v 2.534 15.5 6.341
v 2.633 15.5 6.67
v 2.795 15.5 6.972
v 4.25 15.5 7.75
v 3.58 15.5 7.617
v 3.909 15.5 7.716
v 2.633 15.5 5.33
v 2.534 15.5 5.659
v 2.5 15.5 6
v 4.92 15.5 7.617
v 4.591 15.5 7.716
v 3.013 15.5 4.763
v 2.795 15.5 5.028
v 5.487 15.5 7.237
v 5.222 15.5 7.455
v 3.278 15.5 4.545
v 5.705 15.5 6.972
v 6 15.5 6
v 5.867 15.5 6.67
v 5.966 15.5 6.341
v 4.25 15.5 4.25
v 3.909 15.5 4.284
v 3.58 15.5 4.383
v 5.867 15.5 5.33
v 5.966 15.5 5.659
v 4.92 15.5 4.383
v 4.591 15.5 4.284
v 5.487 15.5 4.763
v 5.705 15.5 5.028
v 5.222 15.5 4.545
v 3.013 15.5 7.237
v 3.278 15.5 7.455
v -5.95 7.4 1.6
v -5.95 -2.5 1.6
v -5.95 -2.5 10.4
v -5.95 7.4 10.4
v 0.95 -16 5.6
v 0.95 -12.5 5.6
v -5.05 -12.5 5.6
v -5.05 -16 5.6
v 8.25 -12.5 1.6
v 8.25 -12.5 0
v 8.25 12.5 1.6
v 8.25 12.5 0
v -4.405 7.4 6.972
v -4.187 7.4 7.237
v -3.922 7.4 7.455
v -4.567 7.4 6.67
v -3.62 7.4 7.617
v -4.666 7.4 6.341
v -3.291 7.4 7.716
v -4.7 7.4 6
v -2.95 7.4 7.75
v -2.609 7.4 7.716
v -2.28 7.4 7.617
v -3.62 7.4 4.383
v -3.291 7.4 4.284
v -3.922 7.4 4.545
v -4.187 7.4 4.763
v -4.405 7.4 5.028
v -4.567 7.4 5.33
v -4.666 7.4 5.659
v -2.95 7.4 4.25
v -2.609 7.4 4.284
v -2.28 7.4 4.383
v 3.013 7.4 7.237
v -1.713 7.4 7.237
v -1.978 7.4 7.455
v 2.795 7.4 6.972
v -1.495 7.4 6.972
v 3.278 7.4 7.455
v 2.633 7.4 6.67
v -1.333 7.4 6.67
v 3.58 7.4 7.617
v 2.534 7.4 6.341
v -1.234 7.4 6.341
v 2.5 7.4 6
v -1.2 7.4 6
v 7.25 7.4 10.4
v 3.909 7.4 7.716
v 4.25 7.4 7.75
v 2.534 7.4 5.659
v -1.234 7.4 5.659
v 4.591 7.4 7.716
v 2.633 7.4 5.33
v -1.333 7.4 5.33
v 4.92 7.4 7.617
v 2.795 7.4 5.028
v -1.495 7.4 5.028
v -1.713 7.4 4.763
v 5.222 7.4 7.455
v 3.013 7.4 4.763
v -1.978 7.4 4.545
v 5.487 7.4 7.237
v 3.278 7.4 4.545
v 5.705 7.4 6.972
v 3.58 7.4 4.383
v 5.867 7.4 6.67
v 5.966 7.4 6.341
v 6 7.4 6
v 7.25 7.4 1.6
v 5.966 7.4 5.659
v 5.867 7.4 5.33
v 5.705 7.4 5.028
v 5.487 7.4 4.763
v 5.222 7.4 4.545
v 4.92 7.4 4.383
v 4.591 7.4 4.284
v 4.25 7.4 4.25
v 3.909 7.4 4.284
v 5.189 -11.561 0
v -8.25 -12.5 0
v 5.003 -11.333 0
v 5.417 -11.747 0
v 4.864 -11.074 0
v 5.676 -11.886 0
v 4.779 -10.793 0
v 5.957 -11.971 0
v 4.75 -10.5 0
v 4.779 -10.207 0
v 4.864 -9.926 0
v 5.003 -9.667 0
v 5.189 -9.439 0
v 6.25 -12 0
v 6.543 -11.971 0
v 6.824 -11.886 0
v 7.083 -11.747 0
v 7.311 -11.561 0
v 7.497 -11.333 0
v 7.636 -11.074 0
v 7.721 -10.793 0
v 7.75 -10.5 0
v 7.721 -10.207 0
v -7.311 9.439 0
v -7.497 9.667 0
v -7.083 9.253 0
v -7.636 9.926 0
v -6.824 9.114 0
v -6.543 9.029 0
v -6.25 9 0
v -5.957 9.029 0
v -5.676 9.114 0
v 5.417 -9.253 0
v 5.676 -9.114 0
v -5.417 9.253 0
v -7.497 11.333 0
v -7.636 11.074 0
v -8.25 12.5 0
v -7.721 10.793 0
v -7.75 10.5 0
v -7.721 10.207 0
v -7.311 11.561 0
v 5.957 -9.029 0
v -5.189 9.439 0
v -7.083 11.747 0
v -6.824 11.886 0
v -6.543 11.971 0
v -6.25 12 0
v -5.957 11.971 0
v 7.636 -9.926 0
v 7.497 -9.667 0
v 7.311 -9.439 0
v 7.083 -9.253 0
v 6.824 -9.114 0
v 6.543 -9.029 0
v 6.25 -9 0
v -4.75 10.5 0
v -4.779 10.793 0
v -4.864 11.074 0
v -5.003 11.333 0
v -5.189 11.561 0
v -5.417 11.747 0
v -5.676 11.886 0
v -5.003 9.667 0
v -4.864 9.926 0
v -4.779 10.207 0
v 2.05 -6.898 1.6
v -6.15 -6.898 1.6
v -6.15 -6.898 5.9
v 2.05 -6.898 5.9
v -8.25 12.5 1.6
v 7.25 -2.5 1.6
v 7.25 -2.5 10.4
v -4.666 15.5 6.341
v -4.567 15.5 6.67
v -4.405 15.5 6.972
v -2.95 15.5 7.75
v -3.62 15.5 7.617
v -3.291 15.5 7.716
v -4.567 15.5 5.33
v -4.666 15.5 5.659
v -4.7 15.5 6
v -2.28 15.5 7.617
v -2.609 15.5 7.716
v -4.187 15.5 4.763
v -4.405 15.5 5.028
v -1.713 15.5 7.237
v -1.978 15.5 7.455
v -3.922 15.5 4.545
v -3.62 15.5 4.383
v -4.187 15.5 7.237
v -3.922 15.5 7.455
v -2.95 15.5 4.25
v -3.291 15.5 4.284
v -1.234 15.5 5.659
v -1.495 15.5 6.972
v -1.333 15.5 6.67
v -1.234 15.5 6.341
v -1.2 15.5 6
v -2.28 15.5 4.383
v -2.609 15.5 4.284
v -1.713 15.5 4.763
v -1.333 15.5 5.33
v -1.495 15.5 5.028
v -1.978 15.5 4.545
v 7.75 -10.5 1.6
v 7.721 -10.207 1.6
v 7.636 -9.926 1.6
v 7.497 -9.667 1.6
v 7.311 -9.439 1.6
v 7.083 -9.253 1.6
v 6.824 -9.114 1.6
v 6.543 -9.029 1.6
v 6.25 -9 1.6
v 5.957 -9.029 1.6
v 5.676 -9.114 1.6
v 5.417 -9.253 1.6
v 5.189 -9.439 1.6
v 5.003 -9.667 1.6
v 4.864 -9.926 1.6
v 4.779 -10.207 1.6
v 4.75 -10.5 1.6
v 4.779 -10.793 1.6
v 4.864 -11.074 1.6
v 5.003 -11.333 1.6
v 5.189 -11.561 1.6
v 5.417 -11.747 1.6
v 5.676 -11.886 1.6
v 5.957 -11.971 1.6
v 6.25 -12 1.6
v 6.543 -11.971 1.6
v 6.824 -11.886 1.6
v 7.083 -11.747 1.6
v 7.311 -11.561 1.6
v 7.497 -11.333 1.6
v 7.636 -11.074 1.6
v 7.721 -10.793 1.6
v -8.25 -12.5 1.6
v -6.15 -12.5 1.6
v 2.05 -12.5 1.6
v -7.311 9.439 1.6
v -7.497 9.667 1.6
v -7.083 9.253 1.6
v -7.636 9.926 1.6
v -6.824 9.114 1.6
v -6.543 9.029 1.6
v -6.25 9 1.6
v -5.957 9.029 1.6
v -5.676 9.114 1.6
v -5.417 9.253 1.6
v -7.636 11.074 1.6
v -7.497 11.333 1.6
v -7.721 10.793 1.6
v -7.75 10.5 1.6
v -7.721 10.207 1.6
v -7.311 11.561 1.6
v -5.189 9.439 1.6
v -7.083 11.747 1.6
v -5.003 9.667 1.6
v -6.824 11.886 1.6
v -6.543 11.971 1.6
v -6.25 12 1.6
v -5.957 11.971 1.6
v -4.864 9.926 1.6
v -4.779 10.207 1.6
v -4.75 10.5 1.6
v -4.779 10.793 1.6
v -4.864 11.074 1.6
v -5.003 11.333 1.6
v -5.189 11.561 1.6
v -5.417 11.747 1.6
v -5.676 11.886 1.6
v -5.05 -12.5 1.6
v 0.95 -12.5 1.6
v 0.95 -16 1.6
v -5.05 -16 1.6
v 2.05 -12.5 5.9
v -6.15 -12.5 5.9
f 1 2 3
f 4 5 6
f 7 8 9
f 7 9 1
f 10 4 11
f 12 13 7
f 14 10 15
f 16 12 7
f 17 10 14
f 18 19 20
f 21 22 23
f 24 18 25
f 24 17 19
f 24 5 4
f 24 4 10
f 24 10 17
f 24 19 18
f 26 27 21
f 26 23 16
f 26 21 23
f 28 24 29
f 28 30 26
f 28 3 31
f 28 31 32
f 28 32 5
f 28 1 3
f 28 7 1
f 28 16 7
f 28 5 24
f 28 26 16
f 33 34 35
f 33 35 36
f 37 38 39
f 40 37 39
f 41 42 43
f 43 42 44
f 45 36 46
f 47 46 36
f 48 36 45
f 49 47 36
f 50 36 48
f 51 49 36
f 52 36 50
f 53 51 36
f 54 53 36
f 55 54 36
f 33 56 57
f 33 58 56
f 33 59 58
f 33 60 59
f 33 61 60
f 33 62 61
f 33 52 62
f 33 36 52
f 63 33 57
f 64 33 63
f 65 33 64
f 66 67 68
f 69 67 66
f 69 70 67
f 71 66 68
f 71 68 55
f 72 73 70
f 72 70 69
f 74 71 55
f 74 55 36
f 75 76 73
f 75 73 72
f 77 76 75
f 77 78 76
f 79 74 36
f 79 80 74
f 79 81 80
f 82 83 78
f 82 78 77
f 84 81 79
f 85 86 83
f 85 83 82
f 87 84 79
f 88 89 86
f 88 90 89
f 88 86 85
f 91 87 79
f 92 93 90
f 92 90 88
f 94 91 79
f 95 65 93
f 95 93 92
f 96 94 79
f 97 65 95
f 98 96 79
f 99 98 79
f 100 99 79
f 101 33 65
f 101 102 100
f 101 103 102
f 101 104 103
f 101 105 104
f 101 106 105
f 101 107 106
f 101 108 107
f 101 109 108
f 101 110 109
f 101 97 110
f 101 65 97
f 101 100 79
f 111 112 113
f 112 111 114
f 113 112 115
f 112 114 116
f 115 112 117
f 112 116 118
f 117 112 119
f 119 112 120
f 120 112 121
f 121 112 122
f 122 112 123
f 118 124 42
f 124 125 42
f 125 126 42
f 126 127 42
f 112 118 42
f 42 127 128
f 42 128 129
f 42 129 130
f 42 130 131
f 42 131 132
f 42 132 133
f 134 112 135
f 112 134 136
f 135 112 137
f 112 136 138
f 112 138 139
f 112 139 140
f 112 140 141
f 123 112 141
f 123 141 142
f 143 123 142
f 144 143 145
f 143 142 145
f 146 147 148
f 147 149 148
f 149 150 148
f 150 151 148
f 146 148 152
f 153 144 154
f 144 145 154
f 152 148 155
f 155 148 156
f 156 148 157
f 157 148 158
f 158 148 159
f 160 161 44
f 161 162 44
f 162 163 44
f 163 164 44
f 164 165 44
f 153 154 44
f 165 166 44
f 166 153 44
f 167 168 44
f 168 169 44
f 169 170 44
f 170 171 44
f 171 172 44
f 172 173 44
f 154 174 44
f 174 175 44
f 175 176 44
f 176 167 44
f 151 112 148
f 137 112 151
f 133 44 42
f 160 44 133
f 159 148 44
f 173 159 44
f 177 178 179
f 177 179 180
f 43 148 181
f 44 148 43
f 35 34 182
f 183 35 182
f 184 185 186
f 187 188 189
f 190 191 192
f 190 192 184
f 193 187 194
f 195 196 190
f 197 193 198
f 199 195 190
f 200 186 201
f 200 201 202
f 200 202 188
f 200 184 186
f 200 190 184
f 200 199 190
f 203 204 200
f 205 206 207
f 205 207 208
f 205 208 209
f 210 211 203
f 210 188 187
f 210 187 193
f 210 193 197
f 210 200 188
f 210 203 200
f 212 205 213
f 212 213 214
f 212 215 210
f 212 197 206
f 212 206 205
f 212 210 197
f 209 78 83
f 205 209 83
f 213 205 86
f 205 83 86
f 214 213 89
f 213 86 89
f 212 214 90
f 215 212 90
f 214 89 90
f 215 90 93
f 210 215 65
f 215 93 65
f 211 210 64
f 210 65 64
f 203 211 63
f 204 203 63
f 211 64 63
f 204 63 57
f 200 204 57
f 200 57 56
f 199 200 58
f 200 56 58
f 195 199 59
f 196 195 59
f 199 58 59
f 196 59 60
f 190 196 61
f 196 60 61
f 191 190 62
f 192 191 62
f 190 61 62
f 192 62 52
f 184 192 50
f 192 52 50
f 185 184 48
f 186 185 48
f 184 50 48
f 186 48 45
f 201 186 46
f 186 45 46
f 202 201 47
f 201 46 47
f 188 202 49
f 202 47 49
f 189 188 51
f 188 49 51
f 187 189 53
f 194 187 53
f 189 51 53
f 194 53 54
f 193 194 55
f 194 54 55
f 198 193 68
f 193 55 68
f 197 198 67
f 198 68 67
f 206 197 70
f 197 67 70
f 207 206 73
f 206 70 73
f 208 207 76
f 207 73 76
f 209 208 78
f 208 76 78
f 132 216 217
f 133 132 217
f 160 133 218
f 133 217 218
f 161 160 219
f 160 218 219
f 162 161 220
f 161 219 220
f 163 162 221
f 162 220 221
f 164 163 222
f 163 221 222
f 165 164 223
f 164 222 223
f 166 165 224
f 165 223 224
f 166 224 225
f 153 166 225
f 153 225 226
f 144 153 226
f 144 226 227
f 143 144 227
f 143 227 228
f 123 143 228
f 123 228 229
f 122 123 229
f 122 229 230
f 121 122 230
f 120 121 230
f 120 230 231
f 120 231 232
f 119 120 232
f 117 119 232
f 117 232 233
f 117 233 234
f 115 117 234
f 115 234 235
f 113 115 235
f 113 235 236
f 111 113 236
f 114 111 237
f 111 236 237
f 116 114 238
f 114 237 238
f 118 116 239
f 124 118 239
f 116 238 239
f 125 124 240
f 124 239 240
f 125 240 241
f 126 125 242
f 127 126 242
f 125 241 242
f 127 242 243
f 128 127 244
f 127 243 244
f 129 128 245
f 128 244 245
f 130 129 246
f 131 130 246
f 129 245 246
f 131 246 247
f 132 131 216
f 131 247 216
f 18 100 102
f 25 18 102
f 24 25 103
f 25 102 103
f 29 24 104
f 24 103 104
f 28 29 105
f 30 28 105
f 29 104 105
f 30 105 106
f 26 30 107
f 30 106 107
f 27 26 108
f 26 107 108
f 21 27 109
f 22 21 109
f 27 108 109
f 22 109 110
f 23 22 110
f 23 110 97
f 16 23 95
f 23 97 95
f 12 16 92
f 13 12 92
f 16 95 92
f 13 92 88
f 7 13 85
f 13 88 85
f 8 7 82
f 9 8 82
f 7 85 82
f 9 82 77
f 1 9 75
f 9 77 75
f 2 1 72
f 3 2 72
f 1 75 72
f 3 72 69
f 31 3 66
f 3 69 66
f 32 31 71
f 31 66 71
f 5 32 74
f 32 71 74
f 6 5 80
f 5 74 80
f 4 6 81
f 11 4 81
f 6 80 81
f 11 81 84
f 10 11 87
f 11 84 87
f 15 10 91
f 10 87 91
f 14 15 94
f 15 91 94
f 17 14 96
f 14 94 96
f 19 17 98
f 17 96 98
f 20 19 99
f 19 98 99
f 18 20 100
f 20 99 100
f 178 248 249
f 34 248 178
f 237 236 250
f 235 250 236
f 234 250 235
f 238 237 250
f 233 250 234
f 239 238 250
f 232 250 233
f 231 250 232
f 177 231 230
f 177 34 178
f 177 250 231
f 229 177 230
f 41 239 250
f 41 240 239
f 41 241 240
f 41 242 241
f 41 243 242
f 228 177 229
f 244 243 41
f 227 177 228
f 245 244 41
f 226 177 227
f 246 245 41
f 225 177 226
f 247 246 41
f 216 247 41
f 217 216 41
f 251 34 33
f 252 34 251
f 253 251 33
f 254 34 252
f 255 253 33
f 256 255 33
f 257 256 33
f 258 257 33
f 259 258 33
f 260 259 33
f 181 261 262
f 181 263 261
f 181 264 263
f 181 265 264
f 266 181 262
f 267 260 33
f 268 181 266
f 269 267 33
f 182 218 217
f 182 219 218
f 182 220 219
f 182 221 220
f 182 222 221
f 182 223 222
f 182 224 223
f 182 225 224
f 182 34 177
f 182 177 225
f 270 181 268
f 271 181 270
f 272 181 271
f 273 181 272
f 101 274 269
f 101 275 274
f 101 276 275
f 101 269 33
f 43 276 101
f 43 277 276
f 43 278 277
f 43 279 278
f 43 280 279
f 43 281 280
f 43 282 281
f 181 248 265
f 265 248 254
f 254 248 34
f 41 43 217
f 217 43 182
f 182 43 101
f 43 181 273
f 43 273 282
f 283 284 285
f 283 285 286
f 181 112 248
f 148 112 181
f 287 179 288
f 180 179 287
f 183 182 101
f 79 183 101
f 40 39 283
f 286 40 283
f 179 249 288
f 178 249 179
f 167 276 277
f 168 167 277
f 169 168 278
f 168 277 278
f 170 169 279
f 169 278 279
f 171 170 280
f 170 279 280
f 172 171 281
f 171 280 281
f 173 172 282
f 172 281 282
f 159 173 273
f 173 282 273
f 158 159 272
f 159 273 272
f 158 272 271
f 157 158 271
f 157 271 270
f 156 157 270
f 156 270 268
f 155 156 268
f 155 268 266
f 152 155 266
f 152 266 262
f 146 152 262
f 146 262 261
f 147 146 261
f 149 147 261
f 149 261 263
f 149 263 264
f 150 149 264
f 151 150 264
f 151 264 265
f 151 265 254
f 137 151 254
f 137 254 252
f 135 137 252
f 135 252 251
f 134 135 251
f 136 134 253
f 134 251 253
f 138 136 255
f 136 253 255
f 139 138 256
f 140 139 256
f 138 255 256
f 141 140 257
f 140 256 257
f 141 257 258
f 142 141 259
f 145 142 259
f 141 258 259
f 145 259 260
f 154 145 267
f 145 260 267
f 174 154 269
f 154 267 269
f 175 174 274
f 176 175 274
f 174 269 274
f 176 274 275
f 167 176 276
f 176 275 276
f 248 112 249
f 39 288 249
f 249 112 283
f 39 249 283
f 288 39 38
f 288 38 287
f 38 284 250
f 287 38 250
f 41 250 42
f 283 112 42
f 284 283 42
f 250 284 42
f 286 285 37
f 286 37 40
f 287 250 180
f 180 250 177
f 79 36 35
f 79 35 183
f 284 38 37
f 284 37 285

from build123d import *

# Parameters (mm, degrees)
SKETCH1_W           = 16.5
SKETCH1_H           = 25
BOSS_EXTRUDE1_DEPTH = 1.6
SKETCH2_R           = 1.5
CUT_EXTRUDE1_DEPTH  = 16.062287343
SKETCH3_W           = 13.2
SKETCH3_H           = 9.9
BOSS_EXTRUDE2_DEPTH = 8.8
SKETCH4_R           = 1.75
BOSS_EXTRUDE3_DEPTH = 8.1
SKETCH5_W           = 8.2
SKETCH5_H           = 5.602380094
BOSS_EXTRUDE4_DEPTH = 4.3
SKETCH6_W           = 6
SKETCH6_H           = 4
BOSS_EXTRUDE5_DEPTH = 3.5


with BuildPart() as part:
    # Sketch1 → Boss-Extrude1 (new body)
    with BuildSketch(Plane.XY):
        Rectangle(SKETCH1_W, SKETCH1_H)
    extrude(amount=BOSS_EXTRUDE1_DEPTH)

    # Sketch2 → Cut-Extrude1 (cut, through all)
    with BuildSketch(Plane.XY.offset(1.6)):
        with Locations((-6.25, 10.5)):
            Circle(SKETCH2_R)
        with Locations((6.25, -10.5)):
            Circle(SKETCH2_R)
    extrude(amount=-CUT_EXTRUDE1_DEPTH, mode=Mode.SUBTRACT)

    # Sketch3 → Boss-Extrude2 (add)
    with BuildSketch(Plane.XY.offset(1.6)):
        with Locations((0.65, 2.45)):
            Rectangle(SKETCH3_W, SKETCH3_H)
    extrude(amount=BOSS_EXTRUDE2_DEPTH)

    # Sketch4 → Boss-Extrude3 (add)
    with BuildSketch(Plane(origin=(0, 7.4, 0), x_dir=(1, 0, 0), z_dir=(0, 1, 0))):
        with Locations((-2.95, -6)):
            Circle(SKETCH4_R)
        with Locations((4.25, -6)):
            Circle(SKETCH4_R)
    extrude(amount=BOSS_EXTRUDE3_DEPTH)

    # Sketch5 → Boss-Extrude4 (add)
    with BuildSketch(Plane.XY.offset(1.6)):
        with Locations((-2.05, -9.698809953)):
            Rectangle(SKETCH5_W, SKETCH5_H)
    extrude(amount=BOSS_EXTRUDE4_DEPTH)

    # Sketch6 → Boss-Extrude5 (add)
    with BuildSketch(Plane(origin=(0, -12.5, 0), x_dir=(-1, 0, 0), z_dir=(0, -1, 0))):
        with Locations((2.05, -3.6)):
            Rectangle(SKETCH6_W, SKETCH6_H)
    extrude(amount=BOSS_EXTRUDE5_DEPTH)


solid = part.part
